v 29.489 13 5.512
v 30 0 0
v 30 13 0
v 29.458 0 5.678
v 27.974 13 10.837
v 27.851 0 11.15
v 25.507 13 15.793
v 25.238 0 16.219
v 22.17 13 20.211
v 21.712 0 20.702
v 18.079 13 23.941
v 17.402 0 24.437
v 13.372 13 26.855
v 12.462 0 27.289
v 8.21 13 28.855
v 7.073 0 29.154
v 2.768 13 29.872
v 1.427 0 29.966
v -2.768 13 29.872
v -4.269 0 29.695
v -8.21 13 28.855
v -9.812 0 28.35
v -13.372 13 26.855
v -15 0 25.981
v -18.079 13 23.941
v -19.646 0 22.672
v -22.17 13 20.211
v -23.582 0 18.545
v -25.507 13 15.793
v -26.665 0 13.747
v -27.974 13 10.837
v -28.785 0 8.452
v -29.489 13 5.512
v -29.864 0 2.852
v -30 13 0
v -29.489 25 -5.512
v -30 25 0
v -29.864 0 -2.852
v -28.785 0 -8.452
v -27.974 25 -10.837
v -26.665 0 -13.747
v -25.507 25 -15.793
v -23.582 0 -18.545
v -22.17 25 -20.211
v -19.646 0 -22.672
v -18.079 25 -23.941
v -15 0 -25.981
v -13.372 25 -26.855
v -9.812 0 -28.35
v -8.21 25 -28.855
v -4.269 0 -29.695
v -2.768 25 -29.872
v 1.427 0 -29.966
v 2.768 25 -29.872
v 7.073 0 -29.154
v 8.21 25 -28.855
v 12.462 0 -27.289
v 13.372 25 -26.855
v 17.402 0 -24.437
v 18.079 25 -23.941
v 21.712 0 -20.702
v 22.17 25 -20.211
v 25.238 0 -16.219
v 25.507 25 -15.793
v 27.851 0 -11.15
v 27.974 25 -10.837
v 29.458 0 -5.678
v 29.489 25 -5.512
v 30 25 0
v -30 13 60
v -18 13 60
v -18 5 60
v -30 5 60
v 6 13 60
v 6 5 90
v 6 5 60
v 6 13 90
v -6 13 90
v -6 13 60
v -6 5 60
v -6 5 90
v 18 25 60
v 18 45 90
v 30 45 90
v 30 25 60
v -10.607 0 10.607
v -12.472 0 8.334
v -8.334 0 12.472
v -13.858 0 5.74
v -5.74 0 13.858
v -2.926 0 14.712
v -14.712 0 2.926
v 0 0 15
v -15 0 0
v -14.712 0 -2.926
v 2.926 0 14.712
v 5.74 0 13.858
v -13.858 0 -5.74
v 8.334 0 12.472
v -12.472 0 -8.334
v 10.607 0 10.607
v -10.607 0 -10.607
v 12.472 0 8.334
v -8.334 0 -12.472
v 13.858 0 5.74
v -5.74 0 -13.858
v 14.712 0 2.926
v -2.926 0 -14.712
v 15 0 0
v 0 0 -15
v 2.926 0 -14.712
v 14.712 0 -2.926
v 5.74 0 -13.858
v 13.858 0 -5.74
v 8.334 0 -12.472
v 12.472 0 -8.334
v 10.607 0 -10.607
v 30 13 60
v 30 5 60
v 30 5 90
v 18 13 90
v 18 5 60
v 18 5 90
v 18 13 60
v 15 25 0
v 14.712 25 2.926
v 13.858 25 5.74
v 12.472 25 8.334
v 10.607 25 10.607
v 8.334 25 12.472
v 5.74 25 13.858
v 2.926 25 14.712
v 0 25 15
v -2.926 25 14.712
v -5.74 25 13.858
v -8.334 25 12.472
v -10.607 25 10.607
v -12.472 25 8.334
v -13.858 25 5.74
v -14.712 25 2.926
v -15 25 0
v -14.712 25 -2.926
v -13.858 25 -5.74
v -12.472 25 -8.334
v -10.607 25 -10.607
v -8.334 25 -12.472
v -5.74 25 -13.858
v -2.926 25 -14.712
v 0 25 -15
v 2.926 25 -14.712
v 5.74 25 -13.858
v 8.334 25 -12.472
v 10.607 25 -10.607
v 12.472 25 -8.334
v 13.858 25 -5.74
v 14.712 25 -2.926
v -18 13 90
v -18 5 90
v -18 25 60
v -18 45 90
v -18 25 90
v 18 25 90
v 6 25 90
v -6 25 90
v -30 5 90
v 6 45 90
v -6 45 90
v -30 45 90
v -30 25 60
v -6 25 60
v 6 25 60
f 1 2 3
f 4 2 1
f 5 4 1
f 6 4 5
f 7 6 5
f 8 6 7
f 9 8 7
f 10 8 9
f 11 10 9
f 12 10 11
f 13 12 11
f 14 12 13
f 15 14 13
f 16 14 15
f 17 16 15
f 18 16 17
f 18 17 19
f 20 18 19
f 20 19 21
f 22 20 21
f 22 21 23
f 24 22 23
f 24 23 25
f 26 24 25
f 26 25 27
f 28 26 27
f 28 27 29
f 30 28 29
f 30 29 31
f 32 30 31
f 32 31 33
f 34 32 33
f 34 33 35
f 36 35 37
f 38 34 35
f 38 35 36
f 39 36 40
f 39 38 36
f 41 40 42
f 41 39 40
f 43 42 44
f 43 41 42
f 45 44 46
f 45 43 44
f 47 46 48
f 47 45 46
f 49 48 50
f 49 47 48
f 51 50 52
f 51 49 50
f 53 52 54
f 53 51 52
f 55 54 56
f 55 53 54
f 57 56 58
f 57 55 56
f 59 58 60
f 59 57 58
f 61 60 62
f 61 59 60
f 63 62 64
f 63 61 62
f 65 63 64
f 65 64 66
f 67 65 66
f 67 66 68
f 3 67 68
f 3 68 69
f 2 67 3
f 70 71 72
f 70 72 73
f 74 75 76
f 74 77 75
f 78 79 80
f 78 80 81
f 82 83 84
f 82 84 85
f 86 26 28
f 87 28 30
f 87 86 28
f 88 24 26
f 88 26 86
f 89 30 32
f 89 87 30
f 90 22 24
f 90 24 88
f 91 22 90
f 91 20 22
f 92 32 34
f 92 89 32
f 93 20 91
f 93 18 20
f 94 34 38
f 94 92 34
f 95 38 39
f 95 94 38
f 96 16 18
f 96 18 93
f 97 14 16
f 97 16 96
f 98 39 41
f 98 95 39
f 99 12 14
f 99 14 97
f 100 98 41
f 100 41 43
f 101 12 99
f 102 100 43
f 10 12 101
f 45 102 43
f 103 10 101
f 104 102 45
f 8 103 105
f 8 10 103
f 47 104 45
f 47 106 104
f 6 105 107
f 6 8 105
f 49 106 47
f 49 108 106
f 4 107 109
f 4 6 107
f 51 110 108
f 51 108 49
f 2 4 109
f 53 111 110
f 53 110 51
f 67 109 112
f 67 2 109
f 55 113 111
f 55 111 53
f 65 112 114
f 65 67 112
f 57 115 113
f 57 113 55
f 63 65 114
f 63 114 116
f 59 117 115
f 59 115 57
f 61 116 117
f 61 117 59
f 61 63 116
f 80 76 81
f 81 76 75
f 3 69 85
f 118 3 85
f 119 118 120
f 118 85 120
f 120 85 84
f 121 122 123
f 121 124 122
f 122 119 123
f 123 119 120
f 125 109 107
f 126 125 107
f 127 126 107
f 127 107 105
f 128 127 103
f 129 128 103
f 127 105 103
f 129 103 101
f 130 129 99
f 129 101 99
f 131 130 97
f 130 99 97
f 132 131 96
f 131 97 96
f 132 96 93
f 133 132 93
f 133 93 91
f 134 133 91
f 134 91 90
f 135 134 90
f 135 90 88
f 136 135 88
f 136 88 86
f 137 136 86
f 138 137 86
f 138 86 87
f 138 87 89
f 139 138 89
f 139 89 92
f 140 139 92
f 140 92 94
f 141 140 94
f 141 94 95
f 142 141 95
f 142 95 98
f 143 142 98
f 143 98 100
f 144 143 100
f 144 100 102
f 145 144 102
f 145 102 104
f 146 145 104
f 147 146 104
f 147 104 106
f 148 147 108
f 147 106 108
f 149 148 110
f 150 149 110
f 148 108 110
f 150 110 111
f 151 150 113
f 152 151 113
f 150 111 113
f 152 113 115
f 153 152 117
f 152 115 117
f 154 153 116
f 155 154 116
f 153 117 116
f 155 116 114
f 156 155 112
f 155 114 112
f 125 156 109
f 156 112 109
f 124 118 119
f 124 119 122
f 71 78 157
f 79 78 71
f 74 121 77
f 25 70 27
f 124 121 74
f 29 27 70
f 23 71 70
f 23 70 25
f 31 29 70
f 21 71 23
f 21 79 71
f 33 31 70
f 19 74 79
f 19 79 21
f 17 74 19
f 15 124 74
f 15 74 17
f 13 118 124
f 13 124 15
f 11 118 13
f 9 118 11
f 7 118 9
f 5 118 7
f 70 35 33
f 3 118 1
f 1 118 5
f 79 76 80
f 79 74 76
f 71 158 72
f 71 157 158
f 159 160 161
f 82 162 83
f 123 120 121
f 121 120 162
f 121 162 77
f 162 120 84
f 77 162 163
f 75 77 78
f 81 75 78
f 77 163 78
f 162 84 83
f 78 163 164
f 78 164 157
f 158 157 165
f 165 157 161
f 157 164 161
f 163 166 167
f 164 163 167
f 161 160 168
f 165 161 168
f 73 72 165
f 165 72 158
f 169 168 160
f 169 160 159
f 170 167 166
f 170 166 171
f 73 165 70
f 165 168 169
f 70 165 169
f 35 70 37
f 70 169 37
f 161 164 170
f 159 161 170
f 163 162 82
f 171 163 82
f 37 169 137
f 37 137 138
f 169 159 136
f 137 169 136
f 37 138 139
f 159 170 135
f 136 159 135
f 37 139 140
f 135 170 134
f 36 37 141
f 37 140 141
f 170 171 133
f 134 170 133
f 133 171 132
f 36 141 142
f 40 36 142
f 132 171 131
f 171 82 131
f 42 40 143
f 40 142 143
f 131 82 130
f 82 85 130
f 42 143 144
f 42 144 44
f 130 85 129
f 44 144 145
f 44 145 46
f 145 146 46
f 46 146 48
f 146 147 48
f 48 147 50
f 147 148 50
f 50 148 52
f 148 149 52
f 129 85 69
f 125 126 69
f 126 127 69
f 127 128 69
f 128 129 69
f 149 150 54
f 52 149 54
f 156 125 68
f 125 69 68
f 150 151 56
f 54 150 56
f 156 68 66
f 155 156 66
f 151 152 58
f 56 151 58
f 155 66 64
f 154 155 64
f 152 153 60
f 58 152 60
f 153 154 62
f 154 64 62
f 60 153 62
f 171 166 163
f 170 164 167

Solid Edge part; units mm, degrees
sketch "Sketch1" plane through (0, 0, 0) normal (0, -1, 0) x (1, 0, 0)
  circle A0 centre (0, 0) radius 30
  circle A1 centre (0, 0) radius 15
extrude "Protrusion1" add sketch "Sketch1" against normal blind 25
sketch "Sketch2" plane through (0, 25, 0) normal (0, 1, 0) x (0, 0, -1)
  line L0 (-90, -30) -> (-90, 30)
  line L1 (-90, 30) -> (0, 30)
  arc A0 (0, -30) -> (0, 30) centre (0, 0) cw
  line L2 (0, -30) -> (-90, -30)
extrude "ExtrudedProtrusion_2" add sketch "Sketch2" against normal blind 12
sketch "Sketch3" plane through (0, 25, 30) normal (0, 1, 0) x (0, 0, 1)
  line L0 (30, 18) -> (60, 18)
  line L1 (60, 18) -> (60, 30)
  line L2 (60, 30) -> (30, 30)
  line L3 (30, 30) -> (30, 18)
  line L4 (30, -6) -> (60, -6)
  line L5 (60, -6) -> (60, 0)
  line L6 (60, 0) -> (60, 6)
  line L7 (60, 6) -> (30, 6)
  line L8 (30, 6) -> (30, 0)
  line L9 (30, 0) -> (30, -6)
  line L10 (60, -18) -> (30, -18)
  line L11 (30, -18) -> (30, -30)
  line L12 (30, -30) -> (60, -30)
  line L13 (60, -30) -> (60, -18)
extrude "ExtrudedProtrusion_3" add sketch "Sketch3" against normal blind 20
sketch "Sketch4" plane through (-30, 15, 45) normal (-1, 0, 0) x (0, 0, 1)
  line L0 (45, 30) -> (15, 10)
  line L1 (15, 10) -> (45, 10)
  line L2 (45, 10) -> (45, 30)
extrude "ExtrudedProtrusion_4" add sketch "Sketch4" against normal blind 60
sketch "Sketch5" plane through (0, 25, 90) normal (0, 0, 1) x (0, -1, 0)
  line L0 (0, 18) -> (-20, 18)
  line L1 (-20, 18) -> (-20, 6)
  line L2 (-20, 6) -> (0, 6)
  line L3 (0, 6) -> (0, 18)
extrude "ExtrudedCutout_1" cut sketch "Sketch5" against normal blind 32
sketch "Sketch6" plane through (0, 25, 90) normal (0, 0, 1) x (0, -1, 0)
  line L0 (0, -6) -> (-20, -6)
  line L1 (-20, -6) -> (-20, -18)
  line L2 (-20, -18) -> (0, -18)
  line L3 (0, -18) -> (0, -6)
extrude "ExtrudedCutout_2" cut sketch "Sketch6" against normal blind 32
